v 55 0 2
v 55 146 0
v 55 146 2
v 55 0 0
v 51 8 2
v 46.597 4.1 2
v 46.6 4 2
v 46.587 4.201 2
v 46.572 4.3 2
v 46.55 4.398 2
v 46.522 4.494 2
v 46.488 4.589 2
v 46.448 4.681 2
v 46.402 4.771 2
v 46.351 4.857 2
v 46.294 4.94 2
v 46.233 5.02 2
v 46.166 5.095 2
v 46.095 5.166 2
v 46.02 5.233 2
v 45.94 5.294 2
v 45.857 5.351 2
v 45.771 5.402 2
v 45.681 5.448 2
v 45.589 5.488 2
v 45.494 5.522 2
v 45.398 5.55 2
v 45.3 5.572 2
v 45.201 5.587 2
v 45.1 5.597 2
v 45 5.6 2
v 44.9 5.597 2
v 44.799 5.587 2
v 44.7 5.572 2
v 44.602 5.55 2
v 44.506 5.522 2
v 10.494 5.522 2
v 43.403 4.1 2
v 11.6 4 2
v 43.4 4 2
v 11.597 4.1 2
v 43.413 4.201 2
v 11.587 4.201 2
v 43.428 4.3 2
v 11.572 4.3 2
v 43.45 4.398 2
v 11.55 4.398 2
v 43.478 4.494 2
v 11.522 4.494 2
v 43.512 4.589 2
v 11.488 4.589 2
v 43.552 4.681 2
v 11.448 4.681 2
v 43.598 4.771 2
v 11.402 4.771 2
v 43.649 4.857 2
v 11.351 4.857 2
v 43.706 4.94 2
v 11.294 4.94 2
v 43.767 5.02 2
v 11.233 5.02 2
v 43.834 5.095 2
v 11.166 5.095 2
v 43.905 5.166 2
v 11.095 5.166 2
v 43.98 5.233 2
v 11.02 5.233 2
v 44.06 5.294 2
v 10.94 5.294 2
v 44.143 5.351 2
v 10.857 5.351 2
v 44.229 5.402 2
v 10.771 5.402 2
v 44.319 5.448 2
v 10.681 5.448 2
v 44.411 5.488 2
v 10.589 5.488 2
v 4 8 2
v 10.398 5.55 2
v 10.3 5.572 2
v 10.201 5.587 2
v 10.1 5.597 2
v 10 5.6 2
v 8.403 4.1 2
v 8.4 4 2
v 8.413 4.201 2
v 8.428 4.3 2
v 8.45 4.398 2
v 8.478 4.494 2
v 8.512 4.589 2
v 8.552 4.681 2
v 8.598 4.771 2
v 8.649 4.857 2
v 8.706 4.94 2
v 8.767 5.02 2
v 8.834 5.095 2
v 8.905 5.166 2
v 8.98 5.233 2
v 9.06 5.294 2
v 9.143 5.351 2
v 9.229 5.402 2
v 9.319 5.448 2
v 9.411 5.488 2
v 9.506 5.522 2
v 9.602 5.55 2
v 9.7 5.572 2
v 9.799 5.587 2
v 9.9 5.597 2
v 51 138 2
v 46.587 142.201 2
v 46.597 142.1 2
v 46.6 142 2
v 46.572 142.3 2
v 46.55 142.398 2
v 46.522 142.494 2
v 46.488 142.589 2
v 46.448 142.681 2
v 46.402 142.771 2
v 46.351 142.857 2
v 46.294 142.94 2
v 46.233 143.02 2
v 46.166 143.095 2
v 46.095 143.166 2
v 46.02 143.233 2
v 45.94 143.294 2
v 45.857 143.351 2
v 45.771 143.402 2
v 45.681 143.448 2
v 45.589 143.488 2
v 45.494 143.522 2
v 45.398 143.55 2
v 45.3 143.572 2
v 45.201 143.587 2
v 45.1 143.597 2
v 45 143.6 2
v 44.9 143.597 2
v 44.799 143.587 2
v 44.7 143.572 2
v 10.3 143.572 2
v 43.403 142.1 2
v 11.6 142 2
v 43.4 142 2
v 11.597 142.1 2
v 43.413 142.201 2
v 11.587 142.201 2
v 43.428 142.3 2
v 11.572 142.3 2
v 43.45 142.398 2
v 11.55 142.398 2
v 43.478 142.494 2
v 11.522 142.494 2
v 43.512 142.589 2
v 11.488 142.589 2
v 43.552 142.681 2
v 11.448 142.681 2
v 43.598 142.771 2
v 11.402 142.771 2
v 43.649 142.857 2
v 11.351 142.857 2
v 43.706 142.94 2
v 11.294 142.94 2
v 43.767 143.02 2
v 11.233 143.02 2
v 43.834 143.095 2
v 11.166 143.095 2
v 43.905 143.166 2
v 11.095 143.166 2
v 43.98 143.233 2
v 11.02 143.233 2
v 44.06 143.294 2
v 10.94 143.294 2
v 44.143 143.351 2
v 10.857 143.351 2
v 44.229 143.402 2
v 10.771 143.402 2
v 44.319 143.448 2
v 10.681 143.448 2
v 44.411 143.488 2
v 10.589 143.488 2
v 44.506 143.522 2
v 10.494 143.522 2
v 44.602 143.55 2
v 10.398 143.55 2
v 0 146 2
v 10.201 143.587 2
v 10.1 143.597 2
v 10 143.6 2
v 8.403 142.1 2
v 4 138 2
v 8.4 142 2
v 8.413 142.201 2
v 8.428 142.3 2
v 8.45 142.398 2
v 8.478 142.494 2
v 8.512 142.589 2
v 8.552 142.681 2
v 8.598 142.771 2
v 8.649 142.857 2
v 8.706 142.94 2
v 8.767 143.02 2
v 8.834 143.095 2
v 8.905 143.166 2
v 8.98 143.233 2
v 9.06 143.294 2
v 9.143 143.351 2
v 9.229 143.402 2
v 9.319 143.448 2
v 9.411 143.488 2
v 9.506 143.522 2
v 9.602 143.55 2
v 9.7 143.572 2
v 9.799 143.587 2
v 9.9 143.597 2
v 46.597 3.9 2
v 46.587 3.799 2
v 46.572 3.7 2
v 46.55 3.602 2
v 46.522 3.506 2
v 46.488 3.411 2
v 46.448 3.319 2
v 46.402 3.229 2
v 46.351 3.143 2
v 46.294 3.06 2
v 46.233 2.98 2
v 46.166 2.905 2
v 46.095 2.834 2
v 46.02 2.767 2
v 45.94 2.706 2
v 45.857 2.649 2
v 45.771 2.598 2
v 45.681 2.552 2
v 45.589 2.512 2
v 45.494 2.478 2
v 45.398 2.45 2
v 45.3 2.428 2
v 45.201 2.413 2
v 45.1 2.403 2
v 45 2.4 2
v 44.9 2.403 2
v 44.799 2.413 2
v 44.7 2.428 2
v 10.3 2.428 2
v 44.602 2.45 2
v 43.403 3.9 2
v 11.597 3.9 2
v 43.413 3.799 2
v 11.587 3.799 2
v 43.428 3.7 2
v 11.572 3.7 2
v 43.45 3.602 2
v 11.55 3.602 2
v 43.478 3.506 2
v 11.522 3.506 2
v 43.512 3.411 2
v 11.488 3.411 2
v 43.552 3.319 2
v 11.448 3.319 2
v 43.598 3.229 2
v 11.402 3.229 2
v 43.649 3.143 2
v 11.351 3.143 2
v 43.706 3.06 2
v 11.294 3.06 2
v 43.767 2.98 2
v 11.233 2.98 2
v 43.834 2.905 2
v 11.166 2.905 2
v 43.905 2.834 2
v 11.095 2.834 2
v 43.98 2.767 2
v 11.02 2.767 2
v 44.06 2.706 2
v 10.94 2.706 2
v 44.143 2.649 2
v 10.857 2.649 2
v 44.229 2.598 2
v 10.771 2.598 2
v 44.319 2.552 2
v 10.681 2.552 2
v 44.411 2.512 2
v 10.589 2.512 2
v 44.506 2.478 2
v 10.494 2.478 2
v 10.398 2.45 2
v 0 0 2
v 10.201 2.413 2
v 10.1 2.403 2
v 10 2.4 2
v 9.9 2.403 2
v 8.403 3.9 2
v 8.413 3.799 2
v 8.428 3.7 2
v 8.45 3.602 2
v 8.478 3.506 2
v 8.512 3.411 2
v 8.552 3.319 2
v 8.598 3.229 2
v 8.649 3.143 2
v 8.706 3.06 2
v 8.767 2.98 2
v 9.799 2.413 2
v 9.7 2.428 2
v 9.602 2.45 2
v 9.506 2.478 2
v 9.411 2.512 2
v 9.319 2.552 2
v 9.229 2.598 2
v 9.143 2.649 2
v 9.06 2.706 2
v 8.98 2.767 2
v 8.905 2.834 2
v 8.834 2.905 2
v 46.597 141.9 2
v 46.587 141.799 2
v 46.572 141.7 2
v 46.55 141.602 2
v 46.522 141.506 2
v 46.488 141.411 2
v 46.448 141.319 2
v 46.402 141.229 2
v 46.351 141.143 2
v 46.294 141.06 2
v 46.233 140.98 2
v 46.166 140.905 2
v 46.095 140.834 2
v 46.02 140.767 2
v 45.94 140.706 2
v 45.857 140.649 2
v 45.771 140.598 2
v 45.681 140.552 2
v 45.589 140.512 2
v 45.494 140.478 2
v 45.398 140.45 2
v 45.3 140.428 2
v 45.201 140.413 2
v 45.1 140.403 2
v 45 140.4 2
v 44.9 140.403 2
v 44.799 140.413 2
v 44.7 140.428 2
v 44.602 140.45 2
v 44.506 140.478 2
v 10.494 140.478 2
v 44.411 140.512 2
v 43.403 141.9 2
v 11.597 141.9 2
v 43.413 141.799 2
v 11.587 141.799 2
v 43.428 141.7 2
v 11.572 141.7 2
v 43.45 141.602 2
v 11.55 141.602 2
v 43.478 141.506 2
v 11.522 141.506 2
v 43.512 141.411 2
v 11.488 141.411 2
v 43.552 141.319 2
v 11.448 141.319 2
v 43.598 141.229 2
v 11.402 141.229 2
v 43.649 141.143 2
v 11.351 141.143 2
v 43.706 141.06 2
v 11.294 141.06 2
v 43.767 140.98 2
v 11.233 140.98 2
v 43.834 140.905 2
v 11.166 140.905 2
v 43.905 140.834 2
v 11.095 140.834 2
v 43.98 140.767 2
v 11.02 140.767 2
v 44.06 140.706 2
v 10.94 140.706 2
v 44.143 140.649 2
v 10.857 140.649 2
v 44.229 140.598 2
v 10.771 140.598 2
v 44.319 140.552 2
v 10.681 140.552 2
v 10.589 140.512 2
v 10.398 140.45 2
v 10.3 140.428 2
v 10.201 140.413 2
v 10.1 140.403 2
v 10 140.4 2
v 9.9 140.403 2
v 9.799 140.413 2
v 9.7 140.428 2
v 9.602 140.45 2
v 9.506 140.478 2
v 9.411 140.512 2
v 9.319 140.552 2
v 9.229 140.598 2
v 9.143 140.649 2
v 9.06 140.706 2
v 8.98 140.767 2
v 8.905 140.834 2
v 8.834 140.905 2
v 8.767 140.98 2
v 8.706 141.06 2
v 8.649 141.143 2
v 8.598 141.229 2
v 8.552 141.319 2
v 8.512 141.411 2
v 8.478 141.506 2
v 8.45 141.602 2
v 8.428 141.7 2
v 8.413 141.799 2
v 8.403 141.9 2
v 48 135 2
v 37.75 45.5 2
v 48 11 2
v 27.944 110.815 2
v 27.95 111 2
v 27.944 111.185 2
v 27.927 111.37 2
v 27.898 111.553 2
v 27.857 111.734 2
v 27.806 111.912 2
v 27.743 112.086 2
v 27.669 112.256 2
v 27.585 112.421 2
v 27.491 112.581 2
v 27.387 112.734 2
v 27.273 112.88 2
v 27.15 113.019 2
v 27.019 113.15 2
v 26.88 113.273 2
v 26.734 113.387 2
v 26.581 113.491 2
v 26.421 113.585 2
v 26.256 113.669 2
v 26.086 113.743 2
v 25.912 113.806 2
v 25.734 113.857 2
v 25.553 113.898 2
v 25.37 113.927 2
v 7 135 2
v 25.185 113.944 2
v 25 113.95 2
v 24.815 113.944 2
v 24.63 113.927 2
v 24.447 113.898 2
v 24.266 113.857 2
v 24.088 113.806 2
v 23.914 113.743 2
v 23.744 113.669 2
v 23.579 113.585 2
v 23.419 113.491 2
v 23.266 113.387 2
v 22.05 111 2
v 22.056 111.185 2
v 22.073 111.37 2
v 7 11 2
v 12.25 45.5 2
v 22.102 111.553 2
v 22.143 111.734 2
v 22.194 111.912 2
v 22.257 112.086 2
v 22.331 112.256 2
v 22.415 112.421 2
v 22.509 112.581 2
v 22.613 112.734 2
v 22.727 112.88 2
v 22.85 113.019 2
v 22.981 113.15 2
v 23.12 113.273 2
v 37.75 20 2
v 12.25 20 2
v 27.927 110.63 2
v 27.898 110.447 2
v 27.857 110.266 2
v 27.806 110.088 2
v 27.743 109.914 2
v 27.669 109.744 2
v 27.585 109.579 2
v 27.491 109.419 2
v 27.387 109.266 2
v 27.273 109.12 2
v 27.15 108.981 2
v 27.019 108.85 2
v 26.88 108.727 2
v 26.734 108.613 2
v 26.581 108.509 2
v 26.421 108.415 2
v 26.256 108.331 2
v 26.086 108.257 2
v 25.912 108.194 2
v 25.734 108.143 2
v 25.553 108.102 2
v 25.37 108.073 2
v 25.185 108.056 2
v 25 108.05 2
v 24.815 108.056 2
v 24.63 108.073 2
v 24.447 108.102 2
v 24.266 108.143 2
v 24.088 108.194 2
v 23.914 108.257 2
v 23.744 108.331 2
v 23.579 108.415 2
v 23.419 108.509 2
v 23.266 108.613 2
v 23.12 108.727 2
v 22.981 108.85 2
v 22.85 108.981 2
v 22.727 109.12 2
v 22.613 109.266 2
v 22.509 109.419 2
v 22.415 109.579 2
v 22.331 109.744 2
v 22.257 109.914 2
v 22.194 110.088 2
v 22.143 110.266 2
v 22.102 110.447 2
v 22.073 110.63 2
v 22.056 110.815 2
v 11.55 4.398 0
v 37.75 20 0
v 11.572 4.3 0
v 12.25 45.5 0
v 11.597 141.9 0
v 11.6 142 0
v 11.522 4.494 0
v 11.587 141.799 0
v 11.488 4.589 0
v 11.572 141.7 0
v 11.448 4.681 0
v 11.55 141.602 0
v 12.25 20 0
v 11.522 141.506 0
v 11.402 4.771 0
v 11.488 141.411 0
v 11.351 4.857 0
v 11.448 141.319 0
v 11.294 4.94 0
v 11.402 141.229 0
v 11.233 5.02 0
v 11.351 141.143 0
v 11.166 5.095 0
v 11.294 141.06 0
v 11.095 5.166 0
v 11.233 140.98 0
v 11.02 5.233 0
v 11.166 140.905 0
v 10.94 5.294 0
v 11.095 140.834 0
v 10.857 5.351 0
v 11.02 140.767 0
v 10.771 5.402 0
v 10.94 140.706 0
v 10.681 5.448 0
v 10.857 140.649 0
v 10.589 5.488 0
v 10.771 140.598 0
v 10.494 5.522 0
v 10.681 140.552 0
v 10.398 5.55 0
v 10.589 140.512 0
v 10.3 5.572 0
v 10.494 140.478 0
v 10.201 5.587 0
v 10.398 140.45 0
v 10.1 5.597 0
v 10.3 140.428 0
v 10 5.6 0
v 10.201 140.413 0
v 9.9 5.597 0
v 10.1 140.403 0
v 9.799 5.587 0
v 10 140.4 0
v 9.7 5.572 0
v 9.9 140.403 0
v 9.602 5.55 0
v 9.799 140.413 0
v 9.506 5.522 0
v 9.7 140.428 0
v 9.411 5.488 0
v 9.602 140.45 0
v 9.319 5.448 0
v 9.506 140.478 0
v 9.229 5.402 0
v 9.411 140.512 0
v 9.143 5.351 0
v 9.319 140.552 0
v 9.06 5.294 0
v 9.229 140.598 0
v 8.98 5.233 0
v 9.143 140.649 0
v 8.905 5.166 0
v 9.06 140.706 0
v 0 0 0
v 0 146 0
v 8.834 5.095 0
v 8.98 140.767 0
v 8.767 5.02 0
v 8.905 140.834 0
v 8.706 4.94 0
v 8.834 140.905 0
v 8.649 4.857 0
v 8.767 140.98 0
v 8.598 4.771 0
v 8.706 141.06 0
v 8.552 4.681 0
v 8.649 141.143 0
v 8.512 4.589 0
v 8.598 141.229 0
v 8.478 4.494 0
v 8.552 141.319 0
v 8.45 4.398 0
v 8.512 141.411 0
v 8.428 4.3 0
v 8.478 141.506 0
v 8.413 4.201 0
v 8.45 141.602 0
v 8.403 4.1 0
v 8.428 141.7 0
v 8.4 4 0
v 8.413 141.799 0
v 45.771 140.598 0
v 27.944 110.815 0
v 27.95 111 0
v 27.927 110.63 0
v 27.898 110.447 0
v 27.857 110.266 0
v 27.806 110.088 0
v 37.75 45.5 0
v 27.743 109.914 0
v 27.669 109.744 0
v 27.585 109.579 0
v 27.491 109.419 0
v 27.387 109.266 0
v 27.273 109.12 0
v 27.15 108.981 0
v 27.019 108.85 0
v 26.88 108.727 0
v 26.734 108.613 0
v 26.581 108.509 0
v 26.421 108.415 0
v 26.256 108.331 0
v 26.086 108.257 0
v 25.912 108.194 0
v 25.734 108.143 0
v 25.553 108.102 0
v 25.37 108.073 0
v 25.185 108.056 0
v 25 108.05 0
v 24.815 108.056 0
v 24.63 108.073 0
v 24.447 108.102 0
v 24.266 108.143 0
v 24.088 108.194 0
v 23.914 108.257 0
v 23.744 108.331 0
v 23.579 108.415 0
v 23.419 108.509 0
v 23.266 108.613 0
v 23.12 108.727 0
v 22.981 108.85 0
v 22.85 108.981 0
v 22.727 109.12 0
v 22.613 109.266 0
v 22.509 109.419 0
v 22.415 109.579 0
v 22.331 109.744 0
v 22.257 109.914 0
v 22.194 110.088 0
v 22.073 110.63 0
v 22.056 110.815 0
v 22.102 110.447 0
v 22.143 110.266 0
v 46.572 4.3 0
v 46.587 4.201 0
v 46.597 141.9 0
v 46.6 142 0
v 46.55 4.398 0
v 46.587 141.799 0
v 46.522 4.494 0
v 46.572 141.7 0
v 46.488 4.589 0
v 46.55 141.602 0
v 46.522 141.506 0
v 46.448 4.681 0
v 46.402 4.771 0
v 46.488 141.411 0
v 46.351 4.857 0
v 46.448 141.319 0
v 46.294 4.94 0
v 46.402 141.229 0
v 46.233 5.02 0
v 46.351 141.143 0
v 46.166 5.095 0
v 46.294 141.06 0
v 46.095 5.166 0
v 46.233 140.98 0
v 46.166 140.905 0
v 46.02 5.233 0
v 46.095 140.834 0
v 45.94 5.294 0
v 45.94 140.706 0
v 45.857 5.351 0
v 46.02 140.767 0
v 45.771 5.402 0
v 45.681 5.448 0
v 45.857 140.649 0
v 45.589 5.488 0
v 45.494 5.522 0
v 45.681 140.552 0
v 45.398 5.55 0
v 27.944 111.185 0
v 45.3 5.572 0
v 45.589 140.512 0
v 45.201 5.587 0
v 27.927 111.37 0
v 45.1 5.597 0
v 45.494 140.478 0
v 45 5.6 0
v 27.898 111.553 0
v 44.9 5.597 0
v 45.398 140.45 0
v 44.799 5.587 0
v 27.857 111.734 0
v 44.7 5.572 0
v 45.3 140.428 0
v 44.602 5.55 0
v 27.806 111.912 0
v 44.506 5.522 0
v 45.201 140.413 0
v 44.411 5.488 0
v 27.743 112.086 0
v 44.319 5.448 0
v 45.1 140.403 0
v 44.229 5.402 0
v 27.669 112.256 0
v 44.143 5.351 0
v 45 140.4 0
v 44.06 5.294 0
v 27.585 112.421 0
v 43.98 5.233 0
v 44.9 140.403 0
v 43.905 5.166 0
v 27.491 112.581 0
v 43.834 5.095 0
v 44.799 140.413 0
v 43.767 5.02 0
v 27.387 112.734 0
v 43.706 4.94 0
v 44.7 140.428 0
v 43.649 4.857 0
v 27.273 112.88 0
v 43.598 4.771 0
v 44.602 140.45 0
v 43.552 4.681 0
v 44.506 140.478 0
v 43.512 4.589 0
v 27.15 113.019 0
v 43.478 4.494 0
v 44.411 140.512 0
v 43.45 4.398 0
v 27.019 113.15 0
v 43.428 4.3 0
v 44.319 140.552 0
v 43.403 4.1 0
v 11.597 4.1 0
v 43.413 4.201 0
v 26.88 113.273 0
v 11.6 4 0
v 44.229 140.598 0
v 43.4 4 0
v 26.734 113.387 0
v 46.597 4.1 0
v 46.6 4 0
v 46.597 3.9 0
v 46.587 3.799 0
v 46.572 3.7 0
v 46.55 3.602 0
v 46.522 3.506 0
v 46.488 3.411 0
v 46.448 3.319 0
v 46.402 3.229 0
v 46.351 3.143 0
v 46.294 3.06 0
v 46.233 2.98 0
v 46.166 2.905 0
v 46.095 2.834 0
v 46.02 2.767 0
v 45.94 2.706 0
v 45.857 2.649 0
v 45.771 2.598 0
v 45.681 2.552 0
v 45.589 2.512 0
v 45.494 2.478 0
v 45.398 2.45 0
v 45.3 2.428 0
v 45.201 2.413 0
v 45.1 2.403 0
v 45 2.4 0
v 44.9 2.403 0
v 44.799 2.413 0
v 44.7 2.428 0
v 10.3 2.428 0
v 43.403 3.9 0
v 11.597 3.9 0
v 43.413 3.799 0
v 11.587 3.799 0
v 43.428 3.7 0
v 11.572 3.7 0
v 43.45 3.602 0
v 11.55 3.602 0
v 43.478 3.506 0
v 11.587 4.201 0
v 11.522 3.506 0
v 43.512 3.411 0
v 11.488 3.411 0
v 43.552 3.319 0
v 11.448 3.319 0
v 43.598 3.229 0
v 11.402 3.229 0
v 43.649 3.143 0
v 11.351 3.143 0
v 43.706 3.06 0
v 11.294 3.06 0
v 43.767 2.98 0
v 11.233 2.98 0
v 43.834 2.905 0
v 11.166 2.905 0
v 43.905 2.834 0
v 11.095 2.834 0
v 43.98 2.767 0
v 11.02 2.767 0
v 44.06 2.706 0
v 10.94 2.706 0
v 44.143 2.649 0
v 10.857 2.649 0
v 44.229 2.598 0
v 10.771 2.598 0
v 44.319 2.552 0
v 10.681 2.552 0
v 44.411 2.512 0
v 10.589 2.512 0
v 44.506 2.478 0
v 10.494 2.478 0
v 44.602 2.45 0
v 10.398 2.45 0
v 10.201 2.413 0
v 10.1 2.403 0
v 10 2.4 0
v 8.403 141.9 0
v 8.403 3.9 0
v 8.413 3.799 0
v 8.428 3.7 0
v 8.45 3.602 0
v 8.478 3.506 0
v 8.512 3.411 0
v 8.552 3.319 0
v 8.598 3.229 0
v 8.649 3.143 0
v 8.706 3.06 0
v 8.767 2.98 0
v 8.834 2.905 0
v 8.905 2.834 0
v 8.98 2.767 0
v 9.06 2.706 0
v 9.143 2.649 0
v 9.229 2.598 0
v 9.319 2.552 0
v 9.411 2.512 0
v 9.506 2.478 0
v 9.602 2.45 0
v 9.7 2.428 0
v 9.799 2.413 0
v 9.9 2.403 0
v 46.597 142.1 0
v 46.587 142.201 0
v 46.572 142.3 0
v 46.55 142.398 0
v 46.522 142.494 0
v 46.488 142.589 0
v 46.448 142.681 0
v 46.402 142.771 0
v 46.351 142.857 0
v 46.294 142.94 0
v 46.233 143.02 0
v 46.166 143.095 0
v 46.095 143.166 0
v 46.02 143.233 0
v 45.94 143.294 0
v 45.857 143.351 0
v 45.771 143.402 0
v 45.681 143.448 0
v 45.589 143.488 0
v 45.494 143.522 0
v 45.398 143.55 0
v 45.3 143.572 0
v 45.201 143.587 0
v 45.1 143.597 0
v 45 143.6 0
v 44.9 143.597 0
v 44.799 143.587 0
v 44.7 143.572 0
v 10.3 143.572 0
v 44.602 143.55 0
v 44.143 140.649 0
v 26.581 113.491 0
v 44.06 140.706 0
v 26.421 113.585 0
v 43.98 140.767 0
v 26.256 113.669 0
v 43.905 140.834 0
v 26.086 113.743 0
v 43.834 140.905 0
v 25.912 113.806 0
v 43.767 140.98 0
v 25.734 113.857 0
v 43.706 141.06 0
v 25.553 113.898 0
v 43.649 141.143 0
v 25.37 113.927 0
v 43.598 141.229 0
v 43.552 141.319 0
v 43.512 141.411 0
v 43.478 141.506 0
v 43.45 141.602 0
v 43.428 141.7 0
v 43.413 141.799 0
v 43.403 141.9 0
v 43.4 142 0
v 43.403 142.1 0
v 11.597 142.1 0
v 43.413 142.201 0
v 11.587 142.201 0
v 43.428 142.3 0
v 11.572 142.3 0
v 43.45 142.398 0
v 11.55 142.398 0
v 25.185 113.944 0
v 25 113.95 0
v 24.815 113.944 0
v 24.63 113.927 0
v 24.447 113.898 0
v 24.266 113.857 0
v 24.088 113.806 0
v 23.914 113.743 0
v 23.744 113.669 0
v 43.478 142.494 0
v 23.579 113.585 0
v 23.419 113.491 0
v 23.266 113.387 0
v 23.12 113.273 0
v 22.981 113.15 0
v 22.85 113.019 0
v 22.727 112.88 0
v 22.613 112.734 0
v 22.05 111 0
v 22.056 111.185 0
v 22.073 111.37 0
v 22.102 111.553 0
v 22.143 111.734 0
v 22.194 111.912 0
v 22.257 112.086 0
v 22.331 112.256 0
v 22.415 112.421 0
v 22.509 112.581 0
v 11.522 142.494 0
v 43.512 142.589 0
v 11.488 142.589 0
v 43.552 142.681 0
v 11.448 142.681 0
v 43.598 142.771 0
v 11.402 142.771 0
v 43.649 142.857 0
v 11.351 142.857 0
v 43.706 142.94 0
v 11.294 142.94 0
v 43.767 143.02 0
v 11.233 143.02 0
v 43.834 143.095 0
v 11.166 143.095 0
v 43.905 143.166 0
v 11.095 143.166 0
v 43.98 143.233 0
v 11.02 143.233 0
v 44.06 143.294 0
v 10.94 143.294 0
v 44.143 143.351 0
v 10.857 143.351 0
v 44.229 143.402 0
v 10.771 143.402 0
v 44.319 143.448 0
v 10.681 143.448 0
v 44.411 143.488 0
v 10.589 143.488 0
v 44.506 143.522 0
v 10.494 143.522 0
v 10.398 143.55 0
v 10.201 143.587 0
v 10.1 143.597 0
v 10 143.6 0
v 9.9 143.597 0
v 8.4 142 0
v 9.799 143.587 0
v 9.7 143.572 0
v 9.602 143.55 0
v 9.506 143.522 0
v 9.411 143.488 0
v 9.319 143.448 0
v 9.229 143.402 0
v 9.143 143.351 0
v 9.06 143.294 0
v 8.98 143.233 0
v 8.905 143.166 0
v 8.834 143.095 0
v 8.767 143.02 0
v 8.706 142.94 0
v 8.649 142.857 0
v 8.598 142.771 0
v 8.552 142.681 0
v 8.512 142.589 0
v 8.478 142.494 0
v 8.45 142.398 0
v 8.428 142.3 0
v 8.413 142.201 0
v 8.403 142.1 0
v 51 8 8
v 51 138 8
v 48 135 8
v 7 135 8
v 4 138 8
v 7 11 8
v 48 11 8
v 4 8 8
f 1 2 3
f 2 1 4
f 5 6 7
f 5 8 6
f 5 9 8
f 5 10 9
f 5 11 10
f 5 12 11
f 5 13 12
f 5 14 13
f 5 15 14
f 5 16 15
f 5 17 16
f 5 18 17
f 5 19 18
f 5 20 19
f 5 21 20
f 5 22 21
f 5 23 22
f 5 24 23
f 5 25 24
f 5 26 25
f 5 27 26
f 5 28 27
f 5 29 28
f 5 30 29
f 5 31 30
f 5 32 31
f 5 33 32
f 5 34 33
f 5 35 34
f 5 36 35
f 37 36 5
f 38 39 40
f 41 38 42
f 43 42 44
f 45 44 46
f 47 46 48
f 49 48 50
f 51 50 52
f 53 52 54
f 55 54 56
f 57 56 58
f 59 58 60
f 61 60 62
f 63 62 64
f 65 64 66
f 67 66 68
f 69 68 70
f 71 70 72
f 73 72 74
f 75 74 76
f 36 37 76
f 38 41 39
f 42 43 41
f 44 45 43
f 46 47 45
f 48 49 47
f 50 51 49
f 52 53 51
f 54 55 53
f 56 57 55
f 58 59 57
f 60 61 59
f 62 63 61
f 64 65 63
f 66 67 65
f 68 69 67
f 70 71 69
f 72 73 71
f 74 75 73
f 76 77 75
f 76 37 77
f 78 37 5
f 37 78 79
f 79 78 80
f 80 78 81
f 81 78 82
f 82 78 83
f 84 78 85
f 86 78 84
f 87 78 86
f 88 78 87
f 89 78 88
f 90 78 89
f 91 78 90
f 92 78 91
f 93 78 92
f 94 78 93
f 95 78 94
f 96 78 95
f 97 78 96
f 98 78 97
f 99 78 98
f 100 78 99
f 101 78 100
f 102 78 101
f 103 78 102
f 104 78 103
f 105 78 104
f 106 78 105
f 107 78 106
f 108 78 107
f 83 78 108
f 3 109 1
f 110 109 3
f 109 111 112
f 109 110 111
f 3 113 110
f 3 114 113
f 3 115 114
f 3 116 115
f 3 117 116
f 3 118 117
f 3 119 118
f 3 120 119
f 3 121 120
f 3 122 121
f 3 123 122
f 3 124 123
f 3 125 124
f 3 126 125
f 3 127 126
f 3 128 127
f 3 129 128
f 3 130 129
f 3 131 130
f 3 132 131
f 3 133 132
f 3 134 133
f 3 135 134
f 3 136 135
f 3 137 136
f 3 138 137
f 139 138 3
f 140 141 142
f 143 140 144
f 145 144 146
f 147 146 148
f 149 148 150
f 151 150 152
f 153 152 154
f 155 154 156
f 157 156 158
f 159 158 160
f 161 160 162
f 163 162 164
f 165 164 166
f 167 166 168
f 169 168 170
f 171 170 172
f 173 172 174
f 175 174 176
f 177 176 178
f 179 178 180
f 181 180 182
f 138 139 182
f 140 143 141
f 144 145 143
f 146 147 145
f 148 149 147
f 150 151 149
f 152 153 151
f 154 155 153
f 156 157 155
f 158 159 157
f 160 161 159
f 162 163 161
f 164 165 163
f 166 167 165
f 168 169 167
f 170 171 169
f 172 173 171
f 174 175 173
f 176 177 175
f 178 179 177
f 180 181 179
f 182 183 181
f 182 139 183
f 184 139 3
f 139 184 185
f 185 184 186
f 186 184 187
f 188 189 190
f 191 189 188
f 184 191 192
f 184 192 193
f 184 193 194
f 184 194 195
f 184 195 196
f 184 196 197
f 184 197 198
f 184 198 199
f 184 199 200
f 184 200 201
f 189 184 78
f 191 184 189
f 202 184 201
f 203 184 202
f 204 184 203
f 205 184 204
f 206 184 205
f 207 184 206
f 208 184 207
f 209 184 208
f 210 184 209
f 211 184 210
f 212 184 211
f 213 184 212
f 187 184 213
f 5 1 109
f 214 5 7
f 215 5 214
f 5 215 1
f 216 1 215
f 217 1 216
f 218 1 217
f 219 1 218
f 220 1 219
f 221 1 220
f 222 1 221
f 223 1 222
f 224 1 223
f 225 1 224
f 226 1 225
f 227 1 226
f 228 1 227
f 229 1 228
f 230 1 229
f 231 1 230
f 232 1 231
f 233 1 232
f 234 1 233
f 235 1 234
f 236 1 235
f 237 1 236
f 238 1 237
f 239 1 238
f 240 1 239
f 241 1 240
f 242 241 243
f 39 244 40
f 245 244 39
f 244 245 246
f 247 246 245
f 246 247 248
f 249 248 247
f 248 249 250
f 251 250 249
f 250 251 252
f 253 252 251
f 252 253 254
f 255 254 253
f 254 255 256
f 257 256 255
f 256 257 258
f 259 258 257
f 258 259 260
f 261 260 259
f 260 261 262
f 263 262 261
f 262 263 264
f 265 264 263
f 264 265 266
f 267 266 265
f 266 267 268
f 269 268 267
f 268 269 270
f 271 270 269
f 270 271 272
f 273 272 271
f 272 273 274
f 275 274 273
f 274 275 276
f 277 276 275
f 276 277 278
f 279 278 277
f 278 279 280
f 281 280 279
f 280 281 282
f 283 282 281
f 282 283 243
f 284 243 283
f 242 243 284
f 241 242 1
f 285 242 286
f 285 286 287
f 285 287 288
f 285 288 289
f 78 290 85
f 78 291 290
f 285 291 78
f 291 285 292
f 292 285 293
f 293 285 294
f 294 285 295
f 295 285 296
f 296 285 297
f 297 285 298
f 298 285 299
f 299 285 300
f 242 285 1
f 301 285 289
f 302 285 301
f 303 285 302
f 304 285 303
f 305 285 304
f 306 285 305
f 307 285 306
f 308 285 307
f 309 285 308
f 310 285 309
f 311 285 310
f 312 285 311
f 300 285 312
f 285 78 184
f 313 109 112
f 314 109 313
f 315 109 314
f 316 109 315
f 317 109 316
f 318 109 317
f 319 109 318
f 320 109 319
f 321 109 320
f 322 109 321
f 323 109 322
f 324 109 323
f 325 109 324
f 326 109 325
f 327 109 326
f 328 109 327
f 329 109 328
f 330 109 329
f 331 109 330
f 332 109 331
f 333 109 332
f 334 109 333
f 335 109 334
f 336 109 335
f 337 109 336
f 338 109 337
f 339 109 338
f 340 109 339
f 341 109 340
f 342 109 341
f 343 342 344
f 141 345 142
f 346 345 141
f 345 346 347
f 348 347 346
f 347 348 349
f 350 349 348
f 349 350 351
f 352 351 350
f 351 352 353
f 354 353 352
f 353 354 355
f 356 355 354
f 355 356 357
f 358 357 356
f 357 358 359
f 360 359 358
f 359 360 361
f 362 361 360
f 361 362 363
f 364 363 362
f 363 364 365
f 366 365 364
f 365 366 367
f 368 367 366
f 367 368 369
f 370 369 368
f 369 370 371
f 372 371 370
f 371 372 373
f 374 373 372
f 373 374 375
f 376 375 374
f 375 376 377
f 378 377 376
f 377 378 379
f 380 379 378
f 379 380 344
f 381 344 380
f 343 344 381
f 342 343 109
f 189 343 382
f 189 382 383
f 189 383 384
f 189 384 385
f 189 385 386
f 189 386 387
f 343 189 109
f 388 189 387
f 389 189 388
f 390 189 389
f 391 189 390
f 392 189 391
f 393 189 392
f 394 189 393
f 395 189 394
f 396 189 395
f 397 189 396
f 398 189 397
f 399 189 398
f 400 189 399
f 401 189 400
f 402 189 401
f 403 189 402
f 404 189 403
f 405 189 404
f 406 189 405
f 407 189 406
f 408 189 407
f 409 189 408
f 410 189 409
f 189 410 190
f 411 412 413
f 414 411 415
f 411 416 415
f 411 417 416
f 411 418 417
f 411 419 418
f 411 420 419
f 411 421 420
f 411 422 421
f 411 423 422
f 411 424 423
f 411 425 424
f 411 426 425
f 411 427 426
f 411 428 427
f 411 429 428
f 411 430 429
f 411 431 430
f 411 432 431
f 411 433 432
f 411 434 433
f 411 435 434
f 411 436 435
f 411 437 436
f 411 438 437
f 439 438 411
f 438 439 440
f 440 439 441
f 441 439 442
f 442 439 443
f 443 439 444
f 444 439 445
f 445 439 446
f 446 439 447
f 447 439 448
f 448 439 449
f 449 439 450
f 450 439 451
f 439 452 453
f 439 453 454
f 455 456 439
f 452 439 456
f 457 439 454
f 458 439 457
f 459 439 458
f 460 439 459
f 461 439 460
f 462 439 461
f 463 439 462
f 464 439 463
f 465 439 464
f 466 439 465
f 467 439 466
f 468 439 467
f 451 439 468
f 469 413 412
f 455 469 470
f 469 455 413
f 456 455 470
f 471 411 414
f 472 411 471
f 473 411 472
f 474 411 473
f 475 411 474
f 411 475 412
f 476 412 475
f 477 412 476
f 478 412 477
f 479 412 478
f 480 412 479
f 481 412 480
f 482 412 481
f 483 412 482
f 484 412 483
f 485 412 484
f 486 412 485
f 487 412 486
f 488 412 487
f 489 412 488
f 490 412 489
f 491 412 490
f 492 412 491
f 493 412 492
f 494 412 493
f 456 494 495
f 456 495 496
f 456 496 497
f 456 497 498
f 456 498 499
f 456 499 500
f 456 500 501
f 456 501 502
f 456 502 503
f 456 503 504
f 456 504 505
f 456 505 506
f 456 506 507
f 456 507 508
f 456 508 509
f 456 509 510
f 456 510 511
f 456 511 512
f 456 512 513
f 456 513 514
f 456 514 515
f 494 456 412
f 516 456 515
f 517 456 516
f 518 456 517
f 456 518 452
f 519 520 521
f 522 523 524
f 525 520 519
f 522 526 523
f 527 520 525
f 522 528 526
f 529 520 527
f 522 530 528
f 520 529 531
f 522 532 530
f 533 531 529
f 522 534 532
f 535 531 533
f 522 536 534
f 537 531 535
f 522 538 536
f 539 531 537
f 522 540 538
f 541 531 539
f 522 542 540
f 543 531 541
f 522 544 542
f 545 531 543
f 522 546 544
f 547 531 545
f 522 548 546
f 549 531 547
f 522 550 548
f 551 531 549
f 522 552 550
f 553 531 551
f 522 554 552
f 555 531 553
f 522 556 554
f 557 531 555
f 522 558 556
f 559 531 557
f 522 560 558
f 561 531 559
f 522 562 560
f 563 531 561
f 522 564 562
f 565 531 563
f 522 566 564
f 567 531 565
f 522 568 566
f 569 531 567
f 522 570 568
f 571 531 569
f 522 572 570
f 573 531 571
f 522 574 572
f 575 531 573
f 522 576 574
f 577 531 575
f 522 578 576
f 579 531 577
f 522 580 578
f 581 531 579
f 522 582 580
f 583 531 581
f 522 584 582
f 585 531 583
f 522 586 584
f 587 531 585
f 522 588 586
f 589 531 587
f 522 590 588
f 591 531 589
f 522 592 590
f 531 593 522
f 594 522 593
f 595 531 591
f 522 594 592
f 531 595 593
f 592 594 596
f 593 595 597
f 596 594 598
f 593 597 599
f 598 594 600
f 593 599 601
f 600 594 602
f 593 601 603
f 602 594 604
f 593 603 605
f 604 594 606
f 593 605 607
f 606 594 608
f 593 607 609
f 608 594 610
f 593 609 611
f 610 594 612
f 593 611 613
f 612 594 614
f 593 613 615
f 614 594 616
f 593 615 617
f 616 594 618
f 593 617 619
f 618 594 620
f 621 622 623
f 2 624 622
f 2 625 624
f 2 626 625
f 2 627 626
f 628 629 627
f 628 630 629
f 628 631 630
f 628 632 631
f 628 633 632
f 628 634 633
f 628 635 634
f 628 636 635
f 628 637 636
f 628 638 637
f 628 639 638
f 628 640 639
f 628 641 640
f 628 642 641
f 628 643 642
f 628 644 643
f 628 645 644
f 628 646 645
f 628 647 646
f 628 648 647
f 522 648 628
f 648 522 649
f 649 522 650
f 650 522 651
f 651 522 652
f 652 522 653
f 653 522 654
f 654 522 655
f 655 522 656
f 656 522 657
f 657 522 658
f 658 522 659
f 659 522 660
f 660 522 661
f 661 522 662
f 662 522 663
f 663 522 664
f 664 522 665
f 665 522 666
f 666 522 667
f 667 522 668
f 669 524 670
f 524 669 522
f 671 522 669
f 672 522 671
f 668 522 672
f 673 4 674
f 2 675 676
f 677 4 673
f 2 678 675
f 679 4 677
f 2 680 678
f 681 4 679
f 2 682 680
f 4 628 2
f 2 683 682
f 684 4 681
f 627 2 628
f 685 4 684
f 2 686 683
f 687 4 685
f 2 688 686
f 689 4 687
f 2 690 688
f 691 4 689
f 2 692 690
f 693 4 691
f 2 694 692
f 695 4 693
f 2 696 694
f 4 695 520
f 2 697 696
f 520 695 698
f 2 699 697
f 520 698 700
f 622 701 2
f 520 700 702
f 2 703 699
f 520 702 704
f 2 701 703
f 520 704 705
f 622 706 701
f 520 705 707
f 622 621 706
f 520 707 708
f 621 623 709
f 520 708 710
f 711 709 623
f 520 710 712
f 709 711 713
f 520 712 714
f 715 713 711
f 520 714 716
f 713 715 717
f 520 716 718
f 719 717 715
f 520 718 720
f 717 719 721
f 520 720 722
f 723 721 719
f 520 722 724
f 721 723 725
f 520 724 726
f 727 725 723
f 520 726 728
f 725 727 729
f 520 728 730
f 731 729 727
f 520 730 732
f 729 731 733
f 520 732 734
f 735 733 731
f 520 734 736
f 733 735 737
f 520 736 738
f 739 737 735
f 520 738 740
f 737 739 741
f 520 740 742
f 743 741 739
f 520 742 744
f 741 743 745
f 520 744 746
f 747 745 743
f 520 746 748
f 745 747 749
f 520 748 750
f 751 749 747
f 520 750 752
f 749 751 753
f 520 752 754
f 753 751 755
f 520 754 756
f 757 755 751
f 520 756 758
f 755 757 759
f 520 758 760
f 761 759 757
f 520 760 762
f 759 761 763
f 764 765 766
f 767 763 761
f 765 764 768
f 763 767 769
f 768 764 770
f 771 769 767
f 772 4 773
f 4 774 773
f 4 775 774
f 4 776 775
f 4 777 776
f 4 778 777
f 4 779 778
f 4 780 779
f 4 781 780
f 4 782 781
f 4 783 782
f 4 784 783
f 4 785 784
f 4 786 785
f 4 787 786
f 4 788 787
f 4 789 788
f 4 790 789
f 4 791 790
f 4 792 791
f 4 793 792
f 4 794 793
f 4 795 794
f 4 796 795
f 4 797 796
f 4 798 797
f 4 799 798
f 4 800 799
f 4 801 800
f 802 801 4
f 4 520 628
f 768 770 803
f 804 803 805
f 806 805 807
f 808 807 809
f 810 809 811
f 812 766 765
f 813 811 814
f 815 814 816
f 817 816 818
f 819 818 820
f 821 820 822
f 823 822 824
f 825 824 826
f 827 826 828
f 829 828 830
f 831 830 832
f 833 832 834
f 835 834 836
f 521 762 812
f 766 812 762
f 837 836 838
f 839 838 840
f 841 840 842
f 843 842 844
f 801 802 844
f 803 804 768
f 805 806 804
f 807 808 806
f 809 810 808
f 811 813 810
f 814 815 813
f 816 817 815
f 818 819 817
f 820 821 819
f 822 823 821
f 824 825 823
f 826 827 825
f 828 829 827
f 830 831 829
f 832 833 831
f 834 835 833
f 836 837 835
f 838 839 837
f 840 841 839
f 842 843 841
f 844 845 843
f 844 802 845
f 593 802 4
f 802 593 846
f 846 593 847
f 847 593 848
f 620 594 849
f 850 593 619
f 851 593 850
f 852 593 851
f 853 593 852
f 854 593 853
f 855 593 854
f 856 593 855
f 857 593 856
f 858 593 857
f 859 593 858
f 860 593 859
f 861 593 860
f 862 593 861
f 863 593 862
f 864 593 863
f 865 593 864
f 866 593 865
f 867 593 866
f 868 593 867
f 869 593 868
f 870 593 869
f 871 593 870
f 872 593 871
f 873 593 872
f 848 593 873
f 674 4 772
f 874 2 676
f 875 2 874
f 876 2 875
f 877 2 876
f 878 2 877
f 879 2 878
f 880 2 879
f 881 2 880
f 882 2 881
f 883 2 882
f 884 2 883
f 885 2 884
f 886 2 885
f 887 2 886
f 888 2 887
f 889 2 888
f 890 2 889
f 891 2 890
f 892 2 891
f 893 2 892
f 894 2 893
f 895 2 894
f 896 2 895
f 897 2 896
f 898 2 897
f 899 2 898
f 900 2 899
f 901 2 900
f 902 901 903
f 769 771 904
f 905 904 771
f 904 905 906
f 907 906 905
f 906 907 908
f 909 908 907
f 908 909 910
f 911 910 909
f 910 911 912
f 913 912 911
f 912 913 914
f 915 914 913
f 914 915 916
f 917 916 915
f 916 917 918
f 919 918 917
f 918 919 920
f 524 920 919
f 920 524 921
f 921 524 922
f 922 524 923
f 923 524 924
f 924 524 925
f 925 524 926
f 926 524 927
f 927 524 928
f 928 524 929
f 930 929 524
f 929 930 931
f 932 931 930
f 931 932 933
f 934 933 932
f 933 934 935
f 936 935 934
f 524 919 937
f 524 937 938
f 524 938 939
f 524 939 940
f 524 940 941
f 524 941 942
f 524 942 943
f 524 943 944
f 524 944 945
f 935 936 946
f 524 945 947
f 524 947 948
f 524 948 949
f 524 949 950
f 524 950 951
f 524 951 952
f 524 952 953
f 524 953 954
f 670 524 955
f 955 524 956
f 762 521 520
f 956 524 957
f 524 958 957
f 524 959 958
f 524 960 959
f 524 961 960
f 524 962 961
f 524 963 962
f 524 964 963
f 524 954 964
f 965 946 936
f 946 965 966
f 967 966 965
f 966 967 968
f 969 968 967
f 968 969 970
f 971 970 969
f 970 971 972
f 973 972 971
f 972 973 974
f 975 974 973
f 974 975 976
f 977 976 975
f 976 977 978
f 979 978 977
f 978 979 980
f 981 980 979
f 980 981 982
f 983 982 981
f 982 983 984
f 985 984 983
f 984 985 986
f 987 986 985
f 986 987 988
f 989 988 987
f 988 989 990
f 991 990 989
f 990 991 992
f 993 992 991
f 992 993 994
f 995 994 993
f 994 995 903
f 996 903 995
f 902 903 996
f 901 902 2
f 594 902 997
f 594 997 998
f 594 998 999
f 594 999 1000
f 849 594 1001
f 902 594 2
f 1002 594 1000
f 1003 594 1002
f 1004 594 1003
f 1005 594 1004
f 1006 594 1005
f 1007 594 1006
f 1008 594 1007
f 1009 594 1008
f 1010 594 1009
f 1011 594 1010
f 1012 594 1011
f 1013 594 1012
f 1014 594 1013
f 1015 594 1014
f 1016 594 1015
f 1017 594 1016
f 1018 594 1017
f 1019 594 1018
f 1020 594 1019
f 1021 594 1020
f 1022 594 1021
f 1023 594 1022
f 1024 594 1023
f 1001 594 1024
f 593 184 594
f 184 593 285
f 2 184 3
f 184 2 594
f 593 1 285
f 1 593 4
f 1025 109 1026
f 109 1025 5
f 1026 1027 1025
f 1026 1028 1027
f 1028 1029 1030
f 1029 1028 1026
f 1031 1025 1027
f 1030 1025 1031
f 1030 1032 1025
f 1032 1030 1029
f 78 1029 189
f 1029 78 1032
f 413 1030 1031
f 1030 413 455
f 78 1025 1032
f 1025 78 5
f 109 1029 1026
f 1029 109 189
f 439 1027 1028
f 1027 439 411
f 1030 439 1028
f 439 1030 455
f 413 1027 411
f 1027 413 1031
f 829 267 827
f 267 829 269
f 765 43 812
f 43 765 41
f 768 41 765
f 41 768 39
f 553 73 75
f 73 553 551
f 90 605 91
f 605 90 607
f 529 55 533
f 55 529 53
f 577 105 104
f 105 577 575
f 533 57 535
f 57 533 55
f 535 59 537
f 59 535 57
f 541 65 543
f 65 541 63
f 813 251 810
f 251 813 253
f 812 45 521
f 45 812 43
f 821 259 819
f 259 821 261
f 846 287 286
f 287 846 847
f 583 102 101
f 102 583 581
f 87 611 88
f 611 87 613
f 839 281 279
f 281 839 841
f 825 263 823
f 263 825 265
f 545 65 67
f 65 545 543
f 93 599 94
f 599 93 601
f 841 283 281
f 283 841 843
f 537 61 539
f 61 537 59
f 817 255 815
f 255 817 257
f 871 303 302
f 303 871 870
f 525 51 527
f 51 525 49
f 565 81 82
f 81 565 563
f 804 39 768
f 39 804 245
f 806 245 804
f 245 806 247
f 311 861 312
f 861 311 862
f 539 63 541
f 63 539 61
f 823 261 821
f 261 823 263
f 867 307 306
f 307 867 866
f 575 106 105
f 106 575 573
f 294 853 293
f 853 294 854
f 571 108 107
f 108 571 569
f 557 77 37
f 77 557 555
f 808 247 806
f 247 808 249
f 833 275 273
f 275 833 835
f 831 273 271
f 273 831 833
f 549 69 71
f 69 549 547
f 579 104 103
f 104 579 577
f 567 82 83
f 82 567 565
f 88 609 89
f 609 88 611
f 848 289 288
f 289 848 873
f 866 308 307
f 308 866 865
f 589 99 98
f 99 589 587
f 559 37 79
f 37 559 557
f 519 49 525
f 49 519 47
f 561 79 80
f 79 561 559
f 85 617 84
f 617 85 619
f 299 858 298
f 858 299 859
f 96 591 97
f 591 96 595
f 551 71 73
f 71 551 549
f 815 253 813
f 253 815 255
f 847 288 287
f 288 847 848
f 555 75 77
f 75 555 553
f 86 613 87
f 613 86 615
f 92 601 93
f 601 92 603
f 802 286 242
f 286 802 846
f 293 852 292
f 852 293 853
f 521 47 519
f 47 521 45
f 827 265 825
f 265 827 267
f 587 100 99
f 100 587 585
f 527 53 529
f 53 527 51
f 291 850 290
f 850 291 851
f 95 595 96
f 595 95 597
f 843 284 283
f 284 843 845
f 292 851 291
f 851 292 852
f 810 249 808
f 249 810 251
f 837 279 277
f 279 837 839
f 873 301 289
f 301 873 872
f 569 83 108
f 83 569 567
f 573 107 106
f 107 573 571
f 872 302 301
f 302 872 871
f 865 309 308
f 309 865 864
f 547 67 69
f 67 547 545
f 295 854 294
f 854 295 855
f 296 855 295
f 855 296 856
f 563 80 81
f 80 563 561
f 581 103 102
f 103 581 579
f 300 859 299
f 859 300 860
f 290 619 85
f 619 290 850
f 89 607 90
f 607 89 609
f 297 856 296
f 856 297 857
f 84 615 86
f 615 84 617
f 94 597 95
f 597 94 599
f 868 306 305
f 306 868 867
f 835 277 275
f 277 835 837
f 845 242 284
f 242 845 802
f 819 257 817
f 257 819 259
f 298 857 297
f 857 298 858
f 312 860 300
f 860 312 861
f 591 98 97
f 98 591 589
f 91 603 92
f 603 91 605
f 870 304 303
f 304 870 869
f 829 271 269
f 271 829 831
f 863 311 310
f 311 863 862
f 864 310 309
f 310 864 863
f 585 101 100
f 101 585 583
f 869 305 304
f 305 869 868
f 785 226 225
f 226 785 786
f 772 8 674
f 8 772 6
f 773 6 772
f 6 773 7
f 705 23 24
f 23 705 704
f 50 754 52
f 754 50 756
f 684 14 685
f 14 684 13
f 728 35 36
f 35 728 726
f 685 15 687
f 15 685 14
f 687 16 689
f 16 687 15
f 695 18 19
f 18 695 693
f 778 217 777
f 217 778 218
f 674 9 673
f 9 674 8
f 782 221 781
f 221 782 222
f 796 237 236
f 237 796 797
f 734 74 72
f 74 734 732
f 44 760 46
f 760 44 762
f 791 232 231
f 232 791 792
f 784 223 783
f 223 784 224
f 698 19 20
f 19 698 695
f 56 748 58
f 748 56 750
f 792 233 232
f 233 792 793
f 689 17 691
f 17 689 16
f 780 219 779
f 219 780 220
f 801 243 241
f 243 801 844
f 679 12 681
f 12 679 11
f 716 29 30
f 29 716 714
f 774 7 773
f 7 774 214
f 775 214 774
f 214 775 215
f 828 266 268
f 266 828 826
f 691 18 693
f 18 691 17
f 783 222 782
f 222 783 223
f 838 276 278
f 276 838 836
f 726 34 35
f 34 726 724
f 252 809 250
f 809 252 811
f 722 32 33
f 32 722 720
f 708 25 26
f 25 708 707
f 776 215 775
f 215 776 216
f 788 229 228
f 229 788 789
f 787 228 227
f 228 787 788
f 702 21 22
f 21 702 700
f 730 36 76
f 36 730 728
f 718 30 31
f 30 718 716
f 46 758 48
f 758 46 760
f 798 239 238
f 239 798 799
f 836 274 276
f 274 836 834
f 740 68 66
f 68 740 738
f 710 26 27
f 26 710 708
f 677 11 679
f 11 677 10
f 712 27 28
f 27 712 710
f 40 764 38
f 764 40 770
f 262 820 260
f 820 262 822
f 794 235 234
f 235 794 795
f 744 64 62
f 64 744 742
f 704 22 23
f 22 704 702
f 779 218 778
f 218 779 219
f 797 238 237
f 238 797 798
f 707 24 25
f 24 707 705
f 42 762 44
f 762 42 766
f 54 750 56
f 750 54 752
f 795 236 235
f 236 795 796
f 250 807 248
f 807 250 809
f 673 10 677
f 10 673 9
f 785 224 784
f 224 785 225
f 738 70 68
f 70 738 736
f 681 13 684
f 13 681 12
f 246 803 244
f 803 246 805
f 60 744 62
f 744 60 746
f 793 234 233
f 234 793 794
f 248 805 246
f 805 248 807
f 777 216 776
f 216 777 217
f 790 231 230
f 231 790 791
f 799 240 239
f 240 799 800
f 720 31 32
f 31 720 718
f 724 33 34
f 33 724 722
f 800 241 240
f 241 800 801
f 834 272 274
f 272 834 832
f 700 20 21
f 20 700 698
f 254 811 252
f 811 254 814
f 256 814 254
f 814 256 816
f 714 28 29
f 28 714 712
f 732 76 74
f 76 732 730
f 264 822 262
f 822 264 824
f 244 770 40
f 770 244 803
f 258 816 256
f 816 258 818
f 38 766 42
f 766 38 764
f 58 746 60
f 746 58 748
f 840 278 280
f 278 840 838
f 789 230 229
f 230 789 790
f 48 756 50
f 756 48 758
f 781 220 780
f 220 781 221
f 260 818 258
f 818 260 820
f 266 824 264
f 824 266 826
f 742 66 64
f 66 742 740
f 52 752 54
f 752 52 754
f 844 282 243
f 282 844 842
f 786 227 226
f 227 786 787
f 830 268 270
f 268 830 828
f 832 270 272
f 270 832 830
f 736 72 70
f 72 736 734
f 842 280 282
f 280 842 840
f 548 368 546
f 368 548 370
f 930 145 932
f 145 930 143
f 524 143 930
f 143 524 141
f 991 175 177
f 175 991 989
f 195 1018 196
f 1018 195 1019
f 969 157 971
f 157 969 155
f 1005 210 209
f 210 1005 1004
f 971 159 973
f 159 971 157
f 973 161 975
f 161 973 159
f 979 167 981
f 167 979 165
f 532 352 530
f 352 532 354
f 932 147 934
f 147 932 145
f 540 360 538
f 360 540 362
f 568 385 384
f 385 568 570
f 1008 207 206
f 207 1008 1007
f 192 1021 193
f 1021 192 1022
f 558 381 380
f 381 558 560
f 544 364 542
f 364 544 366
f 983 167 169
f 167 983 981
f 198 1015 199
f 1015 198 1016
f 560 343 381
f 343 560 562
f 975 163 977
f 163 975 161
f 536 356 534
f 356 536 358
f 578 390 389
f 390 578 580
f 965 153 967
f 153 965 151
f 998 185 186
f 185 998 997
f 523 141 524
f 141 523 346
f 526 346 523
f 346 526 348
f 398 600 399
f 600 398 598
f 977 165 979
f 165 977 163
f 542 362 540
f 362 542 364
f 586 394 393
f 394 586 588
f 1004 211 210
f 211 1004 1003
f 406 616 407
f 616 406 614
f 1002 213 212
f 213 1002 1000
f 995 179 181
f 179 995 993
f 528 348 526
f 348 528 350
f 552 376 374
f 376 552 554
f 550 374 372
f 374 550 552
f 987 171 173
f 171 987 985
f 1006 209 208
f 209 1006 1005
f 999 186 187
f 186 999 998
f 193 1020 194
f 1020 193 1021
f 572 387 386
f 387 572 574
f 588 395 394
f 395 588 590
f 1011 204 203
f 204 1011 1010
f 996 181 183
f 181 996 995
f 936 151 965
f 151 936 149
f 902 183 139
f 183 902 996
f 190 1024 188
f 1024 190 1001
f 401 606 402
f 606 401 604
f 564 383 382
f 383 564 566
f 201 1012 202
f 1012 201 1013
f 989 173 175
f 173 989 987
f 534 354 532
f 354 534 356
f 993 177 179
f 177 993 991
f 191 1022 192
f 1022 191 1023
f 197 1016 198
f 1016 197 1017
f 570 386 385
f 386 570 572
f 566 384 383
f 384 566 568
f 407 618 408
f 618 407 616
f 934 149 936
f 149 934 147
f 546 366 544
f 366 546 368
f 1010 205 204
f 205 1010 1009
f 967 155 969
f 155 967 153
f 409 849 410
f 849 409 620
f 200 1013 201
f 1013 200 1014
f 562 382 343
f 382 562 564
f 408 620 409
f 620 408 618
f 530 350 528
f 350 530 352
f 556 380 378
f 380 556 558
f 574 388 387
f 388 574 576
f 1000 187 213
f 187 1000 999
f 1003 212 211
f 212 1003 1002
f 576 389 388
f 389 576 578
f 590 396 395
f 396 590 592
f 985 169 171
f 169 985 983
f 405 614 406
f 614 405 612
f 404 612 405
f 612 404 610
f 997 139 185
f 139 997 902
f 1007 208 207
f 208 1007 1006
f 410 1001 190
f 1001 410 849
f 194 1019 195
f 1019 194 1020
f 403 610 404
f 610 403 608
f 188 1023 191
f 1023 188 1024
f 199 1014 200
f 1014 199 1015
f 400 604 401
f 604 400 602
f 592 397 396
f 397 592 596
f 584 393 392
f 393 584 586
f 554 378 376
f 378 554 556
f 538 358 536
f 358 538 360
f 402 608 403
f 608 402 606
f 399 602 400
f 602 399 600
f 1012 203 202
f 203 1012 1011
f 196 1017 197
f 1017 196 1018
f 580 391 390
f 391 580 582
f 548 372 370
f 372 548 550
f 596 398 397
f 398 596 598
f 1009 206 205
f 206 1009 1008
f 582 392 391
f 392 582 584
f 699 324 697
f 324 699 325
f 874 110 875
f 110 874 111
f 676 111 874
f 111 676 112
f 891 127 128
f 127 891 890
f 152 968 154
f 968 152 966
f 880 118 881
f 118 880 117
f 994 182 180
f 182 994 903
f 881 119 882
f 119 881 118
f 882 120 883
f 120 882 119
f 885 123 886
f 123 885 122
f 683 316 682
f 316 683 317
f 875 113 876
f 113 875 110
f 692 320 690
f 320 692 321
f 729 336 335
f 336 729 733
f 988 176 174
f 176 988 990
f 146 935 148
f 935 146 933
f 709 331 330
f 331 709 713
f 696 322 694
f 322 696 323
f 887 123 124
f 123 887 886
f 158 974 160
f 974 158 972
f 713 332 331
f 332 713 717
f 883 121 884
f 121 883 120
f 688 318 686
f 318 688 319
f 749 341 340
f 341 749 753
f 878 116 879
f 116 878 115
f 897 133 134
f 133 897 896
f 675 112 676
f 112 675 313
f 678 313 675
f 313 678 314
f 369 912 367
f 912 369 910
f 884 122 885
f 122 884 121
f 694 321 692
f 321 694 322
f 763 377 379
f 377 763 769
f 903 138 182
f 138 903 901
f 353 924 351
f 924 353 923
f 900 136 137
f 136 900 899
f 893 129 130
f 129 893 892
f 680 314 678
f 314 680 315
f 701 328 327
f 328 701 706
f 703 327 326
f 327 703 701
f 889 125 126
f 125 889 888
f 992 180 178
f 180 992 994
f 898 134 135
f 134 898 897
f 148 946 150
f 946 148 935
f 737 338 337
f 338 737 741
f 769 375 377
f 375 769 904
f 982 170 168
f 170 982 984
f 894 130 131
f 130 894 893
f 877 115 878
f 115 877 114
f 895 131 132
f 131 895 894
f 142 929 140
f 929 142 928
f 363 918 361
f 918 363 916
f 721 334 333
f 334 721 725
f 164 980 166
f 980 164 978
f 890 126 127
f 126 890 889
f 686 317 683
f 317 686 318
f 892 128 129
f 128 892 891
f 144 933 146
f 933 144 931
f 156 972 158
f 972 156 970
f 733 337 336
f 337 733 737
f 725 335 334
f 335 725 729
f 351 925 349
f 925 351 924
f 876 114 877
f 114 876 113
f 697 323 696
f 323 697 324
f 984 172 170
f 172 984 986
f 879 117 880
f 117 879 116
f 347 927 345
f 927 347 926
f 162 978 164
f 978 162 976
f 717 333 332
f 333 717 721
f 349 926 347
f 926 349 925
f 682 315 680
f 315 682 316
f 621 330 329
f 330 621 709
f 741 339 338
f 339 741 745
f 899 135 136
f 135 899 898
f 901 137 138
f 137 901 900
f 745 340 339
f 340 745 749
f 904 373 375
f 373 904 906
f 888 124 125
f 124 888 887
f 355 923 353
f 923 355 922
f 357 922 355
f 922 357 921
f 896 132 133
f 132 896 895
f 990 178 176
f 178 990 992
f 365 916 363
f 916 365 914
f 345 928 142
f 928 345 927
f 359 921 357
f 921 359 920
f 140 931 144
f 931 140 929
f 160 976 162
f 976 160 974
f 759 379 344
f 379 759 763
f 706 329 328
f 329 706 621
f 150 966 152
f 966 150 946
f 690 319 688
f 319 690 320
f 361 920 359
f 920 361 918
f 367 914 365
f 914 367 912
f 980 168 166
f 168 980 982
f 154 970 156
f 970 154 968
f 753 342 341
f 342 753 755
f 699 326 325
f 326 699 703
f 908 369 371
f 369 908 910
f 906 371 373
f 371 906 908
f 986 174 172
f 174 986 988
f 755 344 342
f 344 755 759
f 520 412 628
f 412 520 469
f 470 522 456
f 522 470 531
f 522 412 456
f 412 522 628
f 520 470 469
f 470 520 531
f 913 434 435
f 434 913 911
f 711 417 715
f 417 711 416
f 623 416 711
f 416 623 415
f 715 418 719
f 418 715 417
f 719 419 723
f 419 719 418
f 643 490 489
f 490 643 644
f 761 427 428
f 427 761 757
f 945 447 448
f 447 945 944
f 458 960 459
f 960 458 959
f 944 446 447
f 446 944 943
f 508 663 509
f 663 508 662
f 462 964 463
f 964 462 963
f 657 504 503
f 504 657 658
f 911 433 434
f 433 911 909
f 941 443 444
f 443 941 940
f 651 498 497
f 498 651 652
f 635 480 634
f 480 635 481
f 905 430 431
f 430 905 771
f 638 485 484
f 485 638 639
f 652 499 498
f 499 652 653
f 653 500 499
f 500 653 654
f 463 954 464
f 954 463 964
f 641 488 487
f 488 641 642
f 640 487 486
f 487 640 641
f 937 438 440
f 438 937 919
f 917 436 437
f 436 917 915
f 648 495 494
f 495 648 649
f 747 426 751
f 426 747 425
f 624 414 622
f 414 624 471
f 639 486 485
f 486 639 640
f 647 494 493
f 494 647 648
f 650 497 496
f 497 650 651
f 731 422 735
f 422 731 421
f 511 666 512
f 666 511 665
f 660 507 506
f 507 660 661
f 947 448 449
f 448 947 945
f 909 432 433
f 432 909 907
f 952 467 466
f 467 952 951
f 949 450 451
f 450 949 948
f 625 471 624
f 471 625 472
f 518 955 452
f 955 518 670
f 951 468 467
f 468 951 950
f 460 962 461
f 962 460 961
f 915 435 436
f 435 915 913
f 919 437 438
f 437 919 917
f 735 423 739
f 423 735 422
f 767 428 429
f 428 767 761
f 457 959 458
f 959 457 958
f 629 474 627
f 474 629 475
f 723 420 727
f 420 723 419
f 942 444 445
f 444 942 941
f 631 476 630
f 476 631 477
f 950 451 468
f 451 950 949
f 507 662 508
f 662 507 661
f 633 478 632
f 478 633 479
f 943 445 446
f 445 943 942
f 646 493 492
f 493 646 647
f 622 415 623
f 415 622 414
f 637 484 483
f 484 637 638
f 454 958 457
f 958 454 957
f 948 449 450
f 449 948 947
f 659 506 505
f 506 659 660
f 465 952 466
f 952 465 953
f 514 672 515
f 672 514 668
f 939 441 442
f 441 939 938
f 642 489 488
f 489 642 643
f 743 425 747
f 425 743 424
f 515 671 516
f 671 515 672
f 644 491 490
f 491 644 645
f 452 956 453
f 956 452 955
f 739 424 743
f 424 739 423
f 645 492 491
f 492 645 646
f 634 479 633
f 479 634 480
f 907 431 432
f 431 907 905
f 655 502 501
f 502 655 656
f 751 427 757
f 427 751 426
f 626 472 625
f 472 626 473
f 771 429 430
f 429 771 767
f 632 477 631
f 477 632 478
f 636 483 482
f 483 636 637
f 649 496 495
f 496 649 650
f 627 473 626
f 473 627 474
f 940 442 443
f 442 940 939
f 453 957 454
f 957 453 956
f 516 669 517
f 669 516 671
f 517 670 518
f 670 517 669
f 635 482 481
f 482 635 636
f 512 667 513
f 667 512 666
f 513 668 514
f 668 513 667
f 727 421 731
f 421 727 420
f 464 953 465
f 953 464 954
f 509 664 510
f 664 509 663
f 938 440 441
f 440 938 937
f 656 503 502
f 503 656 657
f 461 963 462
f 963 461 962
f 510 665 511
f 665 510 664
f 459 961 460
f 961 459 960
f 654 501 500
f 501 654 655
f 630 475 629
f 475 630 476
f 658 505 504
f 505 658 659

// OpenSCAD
// file: ../../../3Dlibrary/buttons.scad
// types = {
//    default
//    button-adafruit-1119
//    button-adafruit-1009
//    switch-submini
// }

module boxScrewHoles(width = 50, length = 200, overlap = 6) {
    diameter = 3.2;
    overlapTranslation = (overlap - diameter) / 2 + diameter / 2;
    borderDistance = 10;

    translate([borderDistance, overlapTranslation, -10]) cylinder(d=diameter, h=20, $fn=100);
    translate([width - borderDistance, overlapTranslation, -10]) cylinder(d=diameter, h=20, $fn=100);

    translate([borderDistance, length - overlapTranslation, -10]) cylinder(d=diameter, h=20, $fn=100);
    translate([width - borderDistance, length - overlapTranslation, -10]) cylinder(d=diameter, h=20, $fn=100);
}

module boxFaceplate(width = 50, length = 200) {
    thickness = 1;
    overlap = 8;

    difference() {
        cube(size = [width, length, thickness], center = false);
        boxScrewHoles(width, length, overlap);
    }
}

module boxInsert(width = 50, length = 200) {
    thickness = 2;
    overlap = 8;
    lengthOverlap = 4;
    riftThickness = 3;
    riftHeight = 6;

    difference() {
        union() {
            cube(size = [width, length, thickness], center = false);

            // rifts
            translate([lengthOverlap, overlap, thickness]) cube(size = [width - (lengthOverlap * 2), riftThickness, riftHeight], center = false);
            translate([lengthOverlap, length - riftThickness - overlap, thickness]) cube(size = [width - (lengthOverlap * 2), riftThickness, riftHeight], center = false);

            translate([lengthOverlap, overlap, thickness]) cube(size = [riftThickness, length - (overlap * 2), riftHeight], center = false);
            translate([width - lengthOverlap - riftThickness, overlap, thickness]) cube(size = [riftThickness, length - (overlap * 2), riftHeight], center = false);
        }

        boxScrewHoles(width, length, overlap);
    }
}

module ledHole(type="small") {
    if (type == "small") {
        translate([0, 0, -1]) cylinder(d = 3.3, h = 20, $fn = 100);
    } else {
        cylinder(d = 5.1, h = 10, $fn = 100);
    }
}

module buttonCoverHole(type = "default") {
    translate([0, 0, -1])
    if (type == "button-adafruit-1009") {
        cylinder(d = 11.6, h = 10, $fn = 100);
    } else if (type == "button-adafruit-1119") {
        cylinder(d = 6.8, h = 10, $fn = 100);
    } else if (type == "switch-submini") {
        cylinder(d = 4.9, h = 10, $fn = 100);
    } else if (type == "switch-mini") {
        translate([0, 0, -7]) cylinder(d = 5.9, h = 10, $fn = 100);
    } else if (type == "korry") {
        translate([0, 0, -7]) cube([25.5, 25.5, 10]);
    } else {
        cylinder(d = 6.8, h = 10, $fn = 100);
    }
}

module buttonBaseHole(type = "default", socketHoles = false) {
    if (type == "button-adafruit-1009") {
       translate([0, 0, -5]) cylinder(d = 13.1, h = 10, $fn = 100);
       cube(size = [14, 11.9, 16], center = true);
    } else if (type == "button-adafruit-1119") {
       cube(size = [14, 11.9, 7], center = true);
    } else if (type == "switch-submini") {
        translate([0, 0, -7]) cylinder(d = 4.9, h = 10, $fn = 100);
    } else if (type == "switch-mini") {
        translate([0, 0, -7]) cylinder(d = 5.9, h = 10, $fn = 100);
    } else if (type == "korry") {
        translate([0, 0, -7]) cube([25.5, 25.5, 10]);
    } else {
        translate([0, 0, -7]) cylinder(d = 6.8, h = 10, $fn = 100);
    }

    if (socketHoles == true) {
       translate([0, 4.5, -5]) cylinder(d = 1.5, h = 30, $fn = 100);
       translate([0, -4.5, -5]) cylinder(d = 1.5, h = 30, $fn = 100);
    }
}

module buttonBasePocket(type = "default") {
    if (type == "button-adafruit-1009") {
        translate([0, 0, 6.5]) cube(size = [12, 16, 9], center = true);
    } else if (type == "button-adafruit-1119") {
        translate([0, 0, 4]) cube(size = [12, 16, 4], center = true);
    } else {
        // no pocket at all
    }

}
// main file
include <../../../3Dlibrary/buttons.scad>


// faceplate
translate([60, 0, 0]) {
	difference() {
		color("black") boxFaceplate(width = 55, length = 146);
	    translate([12.25, 20, 0]) buttonCoverHole(type = "korry");
		translate([25, 146-35, 0]) buttonCoverHole(type = "switch-mini");

	}
	translate([0, 0, -0.5])
	color("white") {
		linear_extrude(1) {

			font = "Monospace";
			translate([47, 13.5, 0]) {
				// title tailwheel
				rotate([180, 0, 90]) {
					text(text = "TAIL WHEEL", font = font, size = 5);
					translate([-5, -5, 0])
					text(text = "+", font = font, size = 3);
				}
			}

			translate([47, 95, 0]) {
				rotate([180, 0, 90]) {
					// title nvs
					text(text = "NVS Mode", font = font, size = 5);

					translate([0, -4, 0]) {
						translate([11, -7, 0])
						text(text = "FIXED", font = font, size = 3);

						translate([12.5, -31, 0])
						text(text = "OFF", font = font, size = 3);

						translate([27, -13, 0])
						text(text = "N", font = font, size = 3);
						translate([27, -17, 0])
						text(text = "O", font = font, size = 3);
						translate([27, -21, 0])
						text(text = "R", font = font, size = 3);
						translate([27, -25, 0])
						text(text = "M", font = font, size = 3);
					}
				}
			}
		}


		// nvs circle
		translate([25, 146-35, 0])
		difference() {
			cylinder(d=17, h=0.5, $fn = 144);
			translate([0, 0, -1])
			cylinder(d=15, h=5, $fn = 144);
		}

		translate([25, 33, 0.5])
		difference() {
			cube([32, 32, 0.5], center=true);
			translate([0, 0, -1])
			cube([30, 30, 5], center=true);

		}
	}
}

// boxInsert
!difference() {
	boxInsert(width = 55, length = 146);
	translate([12.25, 20, 0]) buttonBaseHole(type = "korry");

	translate([25, 146-35, 0]) buttonBaseHole(type = "switch-mini");
}
